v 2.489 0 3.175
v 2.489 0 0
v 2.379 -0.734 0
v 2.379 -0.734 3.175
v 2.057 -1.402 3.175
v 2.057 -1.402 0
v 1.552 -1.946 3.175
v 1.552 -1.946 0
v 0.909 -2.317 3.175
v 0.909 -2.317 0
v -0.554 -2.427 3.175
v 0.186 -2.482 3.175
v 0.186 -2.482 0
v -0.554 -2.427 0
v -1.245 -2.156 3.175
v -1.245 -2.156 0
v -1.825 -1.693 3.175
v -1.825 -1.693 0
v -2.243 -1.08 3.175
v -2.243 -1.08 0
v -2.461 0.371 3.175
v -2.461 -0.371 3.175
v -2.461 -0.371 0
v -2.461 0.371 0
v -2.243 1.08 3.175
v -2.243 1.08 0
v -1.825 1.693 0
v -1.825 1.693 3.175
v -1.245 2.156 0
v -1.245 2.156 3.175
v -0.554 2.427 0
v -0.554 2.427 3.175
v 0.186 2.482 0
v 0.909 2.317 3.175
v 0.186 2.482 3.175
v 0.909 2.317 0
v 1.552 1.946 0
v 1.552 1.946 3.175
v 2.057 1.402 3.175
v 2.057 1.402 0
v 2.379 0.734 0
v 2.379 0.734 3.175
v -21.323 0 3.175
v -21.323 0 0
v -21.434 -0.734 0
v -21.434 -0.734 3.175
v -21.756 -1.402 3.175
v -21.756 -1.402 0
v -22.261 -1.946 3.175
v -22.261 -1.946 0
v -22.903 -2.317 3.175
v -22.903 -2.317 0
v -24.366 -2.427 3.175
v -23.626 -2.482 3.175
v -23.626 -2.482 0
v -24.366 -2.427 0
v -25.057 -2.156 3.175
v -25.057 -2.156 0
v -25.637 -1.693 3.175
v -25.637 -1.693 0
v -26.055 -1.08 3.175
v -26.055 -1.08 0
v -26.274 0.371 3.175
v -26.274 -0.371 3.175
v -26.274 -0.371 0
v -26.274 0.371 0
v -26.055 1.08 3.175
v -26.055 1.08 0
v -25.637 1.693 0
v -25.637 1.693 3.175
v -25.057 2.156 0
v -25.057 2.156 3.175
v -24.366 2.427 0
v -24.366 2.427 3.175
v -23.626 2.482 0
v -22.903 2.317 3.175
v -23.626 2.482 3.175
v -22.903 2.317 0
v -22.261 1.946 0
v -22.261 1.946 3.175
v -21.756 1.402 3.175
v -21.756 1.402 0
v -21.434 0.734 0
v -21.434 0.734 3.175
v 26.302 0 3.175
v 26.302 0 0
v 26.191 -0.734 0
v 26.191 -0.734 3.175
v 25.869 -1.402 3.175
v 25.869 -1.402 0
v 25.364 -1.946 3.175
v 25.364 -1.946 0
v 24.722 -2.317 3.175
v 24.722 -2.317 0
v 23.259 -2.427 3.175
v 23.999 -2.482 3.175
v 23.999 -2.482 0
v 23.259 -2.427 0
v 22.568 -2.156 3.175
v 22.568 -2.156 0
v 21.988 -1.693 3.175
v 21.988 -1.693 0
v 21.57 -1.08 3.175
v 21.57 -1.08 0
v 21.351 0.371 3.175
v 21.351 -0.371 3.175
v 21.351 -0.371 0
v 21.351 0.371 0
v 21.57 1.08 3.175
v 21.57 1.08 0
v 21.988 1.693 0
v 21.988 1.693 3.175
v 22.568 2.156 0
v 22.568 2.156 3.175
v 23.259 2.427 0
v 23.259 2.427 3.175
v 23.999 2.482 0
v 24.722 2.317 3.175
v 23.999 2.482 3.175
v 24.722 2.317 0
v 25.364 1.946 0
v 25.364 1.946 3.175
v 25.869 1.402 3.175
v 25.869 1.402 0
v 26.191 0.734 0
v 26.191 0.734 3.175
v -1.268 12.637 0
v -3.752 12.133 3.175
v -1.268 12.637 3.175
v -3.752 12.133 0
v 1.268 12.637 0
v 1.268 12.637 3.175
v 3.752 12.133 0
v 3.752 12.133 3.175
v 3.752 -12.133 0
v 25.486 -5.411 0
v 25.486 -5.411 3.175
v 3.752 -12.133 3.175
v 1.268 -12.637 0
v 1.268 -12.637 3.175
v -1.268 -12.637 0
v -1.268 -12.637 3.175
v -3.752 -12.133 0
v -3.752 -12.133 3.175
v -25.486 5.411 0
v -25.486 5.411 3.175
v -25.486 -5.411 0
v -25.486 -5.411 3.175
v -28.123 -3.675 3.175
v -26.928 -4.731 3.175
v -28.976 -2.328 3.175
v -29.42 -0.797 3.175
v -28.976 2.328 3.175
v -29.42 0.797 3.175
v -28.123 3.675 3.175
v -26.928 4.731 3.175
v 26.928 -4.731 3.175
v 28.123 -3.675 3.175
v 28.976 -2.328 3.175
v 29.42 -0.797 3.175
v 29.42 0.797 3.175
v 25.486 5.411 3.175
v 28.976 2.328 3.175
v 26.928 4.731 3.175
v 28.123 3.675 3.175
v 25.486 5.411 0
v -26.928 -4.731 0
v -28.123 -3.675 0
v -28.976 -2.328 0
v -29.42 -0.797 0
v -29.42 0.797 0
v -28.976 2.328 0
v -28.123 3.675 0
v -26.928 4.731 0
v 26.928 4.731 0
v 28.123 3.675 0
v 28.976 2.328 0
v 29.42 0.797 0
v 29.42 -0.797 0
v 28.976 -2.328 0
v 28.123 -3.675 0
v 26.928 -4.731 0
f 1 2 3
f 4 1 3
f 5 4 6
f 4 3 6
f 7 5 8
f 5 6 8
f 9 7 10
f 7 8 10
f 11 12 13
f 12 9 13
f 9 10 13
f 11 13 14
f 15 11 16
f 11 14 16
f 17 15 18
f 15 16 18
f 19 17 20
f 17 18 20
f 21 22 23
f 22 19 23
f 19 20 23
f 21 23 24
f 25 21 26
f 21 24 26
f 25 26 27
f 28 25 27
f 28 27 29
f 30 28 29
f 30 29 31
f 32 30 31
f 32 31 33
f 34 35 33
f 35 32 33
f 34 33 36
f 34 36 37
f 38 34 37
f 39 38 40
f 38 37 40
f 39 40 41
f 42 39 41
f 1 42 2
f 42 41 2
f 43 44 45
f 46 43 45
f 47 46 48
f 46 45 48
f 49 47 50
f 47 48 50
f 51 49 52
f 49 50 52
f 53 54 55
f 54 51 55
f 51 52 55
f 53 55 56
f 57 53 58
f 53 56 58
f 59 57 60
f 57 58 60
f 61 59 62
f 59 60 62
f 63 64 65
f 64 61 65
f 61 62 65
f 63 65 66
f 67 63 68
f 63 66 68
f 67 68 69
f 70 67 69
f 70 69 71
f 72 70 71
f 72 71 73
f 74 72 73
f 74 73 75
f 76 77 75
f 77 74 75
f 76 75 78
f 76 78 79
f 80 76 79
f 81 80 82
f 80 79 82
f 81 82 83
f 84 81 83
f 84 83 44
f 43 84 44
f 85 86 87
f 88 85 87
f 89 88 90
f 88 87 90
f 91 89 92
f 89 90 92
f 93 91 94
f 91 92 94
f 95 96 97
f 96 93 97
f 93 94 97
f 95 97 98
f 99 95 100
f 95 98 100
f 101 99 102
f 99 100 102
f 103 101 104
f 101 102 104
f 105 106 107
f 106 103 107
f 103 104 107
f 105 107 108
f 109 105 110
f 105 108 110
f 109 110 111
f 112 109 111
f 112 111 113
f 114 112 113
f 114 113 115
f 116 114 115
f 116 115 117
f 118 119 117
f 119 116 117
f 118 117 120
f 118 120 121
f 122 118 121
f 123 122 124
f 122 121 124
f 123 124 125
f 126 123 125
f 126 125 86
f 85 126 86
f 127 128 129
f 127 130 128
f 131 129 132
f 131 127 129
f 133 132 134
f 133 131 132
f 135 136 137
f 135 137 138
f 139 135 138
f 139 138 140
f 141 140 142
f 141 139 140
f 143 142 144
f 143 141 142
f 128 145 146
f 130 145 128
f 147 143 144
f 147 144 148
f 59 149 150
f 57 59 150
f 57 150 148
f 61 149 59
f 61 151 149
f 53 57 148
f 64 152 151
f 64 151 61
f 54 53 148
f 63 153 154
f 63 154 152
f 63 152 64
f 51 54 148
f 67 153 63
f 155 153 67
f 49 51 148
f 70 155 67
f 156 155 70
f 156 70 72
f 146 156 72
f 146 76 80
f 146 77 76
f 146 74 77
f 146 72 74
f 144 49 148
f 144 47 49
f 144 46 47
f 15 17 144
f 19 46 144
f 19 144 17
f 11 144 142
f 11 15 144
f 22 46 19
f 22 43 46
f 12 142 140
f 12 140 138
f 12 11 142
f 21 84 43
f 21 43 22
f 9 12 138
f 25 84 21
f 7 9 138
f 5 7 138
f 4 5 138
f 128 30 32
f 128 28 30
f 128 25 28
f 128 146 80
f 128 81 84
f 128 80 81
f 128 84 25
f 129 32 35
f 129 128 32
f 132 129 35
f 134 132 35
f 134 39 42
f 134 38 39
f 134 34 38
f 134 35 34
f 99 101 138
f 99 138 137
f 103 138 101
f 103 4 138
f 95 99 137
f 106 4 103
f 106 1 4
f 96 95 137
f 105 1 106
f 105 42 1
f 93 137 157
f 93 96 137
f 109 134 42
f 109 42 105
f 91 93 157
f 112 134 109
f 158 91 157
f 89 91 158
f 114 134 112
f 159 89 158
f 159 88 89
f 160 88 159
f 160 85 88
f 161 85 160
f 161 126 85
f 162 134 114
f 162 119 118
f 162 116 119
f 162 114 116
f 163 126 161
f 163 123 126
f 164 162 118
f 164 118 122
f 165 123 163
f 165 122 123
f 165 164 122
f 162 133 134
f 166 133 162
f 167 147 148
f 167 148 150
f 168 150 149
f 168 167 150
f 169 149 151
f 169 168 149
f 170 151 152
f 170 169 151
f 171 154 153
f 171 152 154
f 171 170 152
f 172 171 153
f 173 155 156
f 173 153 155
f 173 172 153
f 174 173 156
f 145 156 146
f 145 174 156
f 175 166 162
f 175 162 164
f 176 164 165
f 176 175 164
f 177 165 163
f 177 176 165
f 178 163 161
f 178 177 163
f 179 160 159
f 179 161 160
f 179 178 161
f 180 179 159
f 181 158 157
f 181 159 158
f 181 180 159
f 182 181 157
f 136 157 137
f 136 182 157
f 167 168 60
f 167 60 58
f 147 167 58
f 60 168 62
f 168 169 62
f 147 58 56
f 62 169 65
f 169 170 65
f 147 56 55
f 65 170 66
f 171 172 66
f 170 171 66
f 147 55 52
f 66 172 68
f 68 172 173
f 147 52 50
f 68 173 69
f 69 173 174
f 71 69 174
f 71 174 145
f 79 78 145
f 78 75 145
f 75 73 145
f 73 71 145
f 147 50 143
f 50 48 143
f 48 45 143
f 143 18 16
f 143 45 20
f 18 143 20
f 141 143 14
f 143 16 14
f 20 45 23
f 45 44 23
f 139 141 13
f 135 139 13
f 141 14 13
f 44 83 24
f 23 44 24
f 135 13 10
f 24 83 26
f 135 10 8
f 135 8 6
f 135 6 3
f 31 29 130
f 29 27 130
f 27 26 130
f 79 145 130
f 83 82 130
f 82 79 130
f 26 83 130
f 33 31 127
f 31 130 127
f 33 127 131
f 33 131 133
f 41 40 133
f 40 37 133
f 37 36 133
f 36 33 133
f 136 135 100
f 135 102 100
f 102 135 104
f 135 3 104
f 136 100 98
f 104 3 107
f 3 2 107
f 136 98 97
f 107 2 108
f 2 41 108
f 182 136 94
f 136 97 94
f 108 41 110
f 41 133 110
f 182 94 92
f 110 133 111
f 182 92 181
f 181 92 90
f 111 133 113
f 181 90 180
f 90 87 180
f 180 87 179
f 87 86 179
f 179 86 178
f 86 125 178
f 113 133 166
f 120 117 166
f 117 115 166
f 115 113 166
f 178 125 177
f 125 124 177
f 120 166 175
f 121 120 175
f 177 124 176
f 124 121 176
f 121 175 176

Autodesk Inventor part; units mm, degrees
ref_plane "YZ Plane" through (0, 0, 0) normal (1, 0, 0) x (0, 1, 0)
ref_plane "XZ Plane" through (0, 0, 0) normal (0, 1, 0) x (-1, 0, 0)
ref_plane "XY Plane" through (0, 0, 0) normal (0, 0, 1) x (1, 0, 0)
sketch "Sketch1" plane through (0, 0, 0) normal (0, 0, 1) x (1, 0, 0)
  circle A0 centre (0, 0) radius 23.8125 construction
  circle A1 centre (-23.8125, 0) radius 2.4892
  circle A2 centre (23.8125, 0) radius 2.4892
  line L0 (-23.8125, 0) -> (23.8125, 0) construction
  circle A3 centre (0, 0) radius 2.4892
  arc A4 (-25.4861, 5.4113) -> (-25.4861, -5.4113) centre (-23.8125, 0) ccw
  arc A5 (25.4861, -5.4113) -> (25.4861, 5.4113) centre (23.8125, 0) ccw
  line L1 (-25.4861, 5.4113) -> (-3.7524, 12.133)
  line L2 (3.7524, 12.133) -> (25.4861, 5.4113)
  line L3 (25.4861, -5.4113) -> (3.7524, -12.133)
  line L4 (-3.7524, -12.133) -> (-25.4861, -5.4113)
  arc A6 (-3.7524, -12.133) -> (3.7524, -12.133) centre (0, 0) ccw
  arc A7 (3.7524, 12.133) -> (-3.7524, 12.133) centre (0, 0) ccw
  dimension "d0" = 47.625
  dimension "d1" = 4.9784
  dimension "d2" = 3.175
  dimension "d4" = 12.7
  dimension "d5" = 12.7
extrude "Extrusion1" add sketch "Sketch1" along normal blind 3.175
properties part number "Pison Shaft Replacement Screw Plate" material "Thermoplastic Resin"
